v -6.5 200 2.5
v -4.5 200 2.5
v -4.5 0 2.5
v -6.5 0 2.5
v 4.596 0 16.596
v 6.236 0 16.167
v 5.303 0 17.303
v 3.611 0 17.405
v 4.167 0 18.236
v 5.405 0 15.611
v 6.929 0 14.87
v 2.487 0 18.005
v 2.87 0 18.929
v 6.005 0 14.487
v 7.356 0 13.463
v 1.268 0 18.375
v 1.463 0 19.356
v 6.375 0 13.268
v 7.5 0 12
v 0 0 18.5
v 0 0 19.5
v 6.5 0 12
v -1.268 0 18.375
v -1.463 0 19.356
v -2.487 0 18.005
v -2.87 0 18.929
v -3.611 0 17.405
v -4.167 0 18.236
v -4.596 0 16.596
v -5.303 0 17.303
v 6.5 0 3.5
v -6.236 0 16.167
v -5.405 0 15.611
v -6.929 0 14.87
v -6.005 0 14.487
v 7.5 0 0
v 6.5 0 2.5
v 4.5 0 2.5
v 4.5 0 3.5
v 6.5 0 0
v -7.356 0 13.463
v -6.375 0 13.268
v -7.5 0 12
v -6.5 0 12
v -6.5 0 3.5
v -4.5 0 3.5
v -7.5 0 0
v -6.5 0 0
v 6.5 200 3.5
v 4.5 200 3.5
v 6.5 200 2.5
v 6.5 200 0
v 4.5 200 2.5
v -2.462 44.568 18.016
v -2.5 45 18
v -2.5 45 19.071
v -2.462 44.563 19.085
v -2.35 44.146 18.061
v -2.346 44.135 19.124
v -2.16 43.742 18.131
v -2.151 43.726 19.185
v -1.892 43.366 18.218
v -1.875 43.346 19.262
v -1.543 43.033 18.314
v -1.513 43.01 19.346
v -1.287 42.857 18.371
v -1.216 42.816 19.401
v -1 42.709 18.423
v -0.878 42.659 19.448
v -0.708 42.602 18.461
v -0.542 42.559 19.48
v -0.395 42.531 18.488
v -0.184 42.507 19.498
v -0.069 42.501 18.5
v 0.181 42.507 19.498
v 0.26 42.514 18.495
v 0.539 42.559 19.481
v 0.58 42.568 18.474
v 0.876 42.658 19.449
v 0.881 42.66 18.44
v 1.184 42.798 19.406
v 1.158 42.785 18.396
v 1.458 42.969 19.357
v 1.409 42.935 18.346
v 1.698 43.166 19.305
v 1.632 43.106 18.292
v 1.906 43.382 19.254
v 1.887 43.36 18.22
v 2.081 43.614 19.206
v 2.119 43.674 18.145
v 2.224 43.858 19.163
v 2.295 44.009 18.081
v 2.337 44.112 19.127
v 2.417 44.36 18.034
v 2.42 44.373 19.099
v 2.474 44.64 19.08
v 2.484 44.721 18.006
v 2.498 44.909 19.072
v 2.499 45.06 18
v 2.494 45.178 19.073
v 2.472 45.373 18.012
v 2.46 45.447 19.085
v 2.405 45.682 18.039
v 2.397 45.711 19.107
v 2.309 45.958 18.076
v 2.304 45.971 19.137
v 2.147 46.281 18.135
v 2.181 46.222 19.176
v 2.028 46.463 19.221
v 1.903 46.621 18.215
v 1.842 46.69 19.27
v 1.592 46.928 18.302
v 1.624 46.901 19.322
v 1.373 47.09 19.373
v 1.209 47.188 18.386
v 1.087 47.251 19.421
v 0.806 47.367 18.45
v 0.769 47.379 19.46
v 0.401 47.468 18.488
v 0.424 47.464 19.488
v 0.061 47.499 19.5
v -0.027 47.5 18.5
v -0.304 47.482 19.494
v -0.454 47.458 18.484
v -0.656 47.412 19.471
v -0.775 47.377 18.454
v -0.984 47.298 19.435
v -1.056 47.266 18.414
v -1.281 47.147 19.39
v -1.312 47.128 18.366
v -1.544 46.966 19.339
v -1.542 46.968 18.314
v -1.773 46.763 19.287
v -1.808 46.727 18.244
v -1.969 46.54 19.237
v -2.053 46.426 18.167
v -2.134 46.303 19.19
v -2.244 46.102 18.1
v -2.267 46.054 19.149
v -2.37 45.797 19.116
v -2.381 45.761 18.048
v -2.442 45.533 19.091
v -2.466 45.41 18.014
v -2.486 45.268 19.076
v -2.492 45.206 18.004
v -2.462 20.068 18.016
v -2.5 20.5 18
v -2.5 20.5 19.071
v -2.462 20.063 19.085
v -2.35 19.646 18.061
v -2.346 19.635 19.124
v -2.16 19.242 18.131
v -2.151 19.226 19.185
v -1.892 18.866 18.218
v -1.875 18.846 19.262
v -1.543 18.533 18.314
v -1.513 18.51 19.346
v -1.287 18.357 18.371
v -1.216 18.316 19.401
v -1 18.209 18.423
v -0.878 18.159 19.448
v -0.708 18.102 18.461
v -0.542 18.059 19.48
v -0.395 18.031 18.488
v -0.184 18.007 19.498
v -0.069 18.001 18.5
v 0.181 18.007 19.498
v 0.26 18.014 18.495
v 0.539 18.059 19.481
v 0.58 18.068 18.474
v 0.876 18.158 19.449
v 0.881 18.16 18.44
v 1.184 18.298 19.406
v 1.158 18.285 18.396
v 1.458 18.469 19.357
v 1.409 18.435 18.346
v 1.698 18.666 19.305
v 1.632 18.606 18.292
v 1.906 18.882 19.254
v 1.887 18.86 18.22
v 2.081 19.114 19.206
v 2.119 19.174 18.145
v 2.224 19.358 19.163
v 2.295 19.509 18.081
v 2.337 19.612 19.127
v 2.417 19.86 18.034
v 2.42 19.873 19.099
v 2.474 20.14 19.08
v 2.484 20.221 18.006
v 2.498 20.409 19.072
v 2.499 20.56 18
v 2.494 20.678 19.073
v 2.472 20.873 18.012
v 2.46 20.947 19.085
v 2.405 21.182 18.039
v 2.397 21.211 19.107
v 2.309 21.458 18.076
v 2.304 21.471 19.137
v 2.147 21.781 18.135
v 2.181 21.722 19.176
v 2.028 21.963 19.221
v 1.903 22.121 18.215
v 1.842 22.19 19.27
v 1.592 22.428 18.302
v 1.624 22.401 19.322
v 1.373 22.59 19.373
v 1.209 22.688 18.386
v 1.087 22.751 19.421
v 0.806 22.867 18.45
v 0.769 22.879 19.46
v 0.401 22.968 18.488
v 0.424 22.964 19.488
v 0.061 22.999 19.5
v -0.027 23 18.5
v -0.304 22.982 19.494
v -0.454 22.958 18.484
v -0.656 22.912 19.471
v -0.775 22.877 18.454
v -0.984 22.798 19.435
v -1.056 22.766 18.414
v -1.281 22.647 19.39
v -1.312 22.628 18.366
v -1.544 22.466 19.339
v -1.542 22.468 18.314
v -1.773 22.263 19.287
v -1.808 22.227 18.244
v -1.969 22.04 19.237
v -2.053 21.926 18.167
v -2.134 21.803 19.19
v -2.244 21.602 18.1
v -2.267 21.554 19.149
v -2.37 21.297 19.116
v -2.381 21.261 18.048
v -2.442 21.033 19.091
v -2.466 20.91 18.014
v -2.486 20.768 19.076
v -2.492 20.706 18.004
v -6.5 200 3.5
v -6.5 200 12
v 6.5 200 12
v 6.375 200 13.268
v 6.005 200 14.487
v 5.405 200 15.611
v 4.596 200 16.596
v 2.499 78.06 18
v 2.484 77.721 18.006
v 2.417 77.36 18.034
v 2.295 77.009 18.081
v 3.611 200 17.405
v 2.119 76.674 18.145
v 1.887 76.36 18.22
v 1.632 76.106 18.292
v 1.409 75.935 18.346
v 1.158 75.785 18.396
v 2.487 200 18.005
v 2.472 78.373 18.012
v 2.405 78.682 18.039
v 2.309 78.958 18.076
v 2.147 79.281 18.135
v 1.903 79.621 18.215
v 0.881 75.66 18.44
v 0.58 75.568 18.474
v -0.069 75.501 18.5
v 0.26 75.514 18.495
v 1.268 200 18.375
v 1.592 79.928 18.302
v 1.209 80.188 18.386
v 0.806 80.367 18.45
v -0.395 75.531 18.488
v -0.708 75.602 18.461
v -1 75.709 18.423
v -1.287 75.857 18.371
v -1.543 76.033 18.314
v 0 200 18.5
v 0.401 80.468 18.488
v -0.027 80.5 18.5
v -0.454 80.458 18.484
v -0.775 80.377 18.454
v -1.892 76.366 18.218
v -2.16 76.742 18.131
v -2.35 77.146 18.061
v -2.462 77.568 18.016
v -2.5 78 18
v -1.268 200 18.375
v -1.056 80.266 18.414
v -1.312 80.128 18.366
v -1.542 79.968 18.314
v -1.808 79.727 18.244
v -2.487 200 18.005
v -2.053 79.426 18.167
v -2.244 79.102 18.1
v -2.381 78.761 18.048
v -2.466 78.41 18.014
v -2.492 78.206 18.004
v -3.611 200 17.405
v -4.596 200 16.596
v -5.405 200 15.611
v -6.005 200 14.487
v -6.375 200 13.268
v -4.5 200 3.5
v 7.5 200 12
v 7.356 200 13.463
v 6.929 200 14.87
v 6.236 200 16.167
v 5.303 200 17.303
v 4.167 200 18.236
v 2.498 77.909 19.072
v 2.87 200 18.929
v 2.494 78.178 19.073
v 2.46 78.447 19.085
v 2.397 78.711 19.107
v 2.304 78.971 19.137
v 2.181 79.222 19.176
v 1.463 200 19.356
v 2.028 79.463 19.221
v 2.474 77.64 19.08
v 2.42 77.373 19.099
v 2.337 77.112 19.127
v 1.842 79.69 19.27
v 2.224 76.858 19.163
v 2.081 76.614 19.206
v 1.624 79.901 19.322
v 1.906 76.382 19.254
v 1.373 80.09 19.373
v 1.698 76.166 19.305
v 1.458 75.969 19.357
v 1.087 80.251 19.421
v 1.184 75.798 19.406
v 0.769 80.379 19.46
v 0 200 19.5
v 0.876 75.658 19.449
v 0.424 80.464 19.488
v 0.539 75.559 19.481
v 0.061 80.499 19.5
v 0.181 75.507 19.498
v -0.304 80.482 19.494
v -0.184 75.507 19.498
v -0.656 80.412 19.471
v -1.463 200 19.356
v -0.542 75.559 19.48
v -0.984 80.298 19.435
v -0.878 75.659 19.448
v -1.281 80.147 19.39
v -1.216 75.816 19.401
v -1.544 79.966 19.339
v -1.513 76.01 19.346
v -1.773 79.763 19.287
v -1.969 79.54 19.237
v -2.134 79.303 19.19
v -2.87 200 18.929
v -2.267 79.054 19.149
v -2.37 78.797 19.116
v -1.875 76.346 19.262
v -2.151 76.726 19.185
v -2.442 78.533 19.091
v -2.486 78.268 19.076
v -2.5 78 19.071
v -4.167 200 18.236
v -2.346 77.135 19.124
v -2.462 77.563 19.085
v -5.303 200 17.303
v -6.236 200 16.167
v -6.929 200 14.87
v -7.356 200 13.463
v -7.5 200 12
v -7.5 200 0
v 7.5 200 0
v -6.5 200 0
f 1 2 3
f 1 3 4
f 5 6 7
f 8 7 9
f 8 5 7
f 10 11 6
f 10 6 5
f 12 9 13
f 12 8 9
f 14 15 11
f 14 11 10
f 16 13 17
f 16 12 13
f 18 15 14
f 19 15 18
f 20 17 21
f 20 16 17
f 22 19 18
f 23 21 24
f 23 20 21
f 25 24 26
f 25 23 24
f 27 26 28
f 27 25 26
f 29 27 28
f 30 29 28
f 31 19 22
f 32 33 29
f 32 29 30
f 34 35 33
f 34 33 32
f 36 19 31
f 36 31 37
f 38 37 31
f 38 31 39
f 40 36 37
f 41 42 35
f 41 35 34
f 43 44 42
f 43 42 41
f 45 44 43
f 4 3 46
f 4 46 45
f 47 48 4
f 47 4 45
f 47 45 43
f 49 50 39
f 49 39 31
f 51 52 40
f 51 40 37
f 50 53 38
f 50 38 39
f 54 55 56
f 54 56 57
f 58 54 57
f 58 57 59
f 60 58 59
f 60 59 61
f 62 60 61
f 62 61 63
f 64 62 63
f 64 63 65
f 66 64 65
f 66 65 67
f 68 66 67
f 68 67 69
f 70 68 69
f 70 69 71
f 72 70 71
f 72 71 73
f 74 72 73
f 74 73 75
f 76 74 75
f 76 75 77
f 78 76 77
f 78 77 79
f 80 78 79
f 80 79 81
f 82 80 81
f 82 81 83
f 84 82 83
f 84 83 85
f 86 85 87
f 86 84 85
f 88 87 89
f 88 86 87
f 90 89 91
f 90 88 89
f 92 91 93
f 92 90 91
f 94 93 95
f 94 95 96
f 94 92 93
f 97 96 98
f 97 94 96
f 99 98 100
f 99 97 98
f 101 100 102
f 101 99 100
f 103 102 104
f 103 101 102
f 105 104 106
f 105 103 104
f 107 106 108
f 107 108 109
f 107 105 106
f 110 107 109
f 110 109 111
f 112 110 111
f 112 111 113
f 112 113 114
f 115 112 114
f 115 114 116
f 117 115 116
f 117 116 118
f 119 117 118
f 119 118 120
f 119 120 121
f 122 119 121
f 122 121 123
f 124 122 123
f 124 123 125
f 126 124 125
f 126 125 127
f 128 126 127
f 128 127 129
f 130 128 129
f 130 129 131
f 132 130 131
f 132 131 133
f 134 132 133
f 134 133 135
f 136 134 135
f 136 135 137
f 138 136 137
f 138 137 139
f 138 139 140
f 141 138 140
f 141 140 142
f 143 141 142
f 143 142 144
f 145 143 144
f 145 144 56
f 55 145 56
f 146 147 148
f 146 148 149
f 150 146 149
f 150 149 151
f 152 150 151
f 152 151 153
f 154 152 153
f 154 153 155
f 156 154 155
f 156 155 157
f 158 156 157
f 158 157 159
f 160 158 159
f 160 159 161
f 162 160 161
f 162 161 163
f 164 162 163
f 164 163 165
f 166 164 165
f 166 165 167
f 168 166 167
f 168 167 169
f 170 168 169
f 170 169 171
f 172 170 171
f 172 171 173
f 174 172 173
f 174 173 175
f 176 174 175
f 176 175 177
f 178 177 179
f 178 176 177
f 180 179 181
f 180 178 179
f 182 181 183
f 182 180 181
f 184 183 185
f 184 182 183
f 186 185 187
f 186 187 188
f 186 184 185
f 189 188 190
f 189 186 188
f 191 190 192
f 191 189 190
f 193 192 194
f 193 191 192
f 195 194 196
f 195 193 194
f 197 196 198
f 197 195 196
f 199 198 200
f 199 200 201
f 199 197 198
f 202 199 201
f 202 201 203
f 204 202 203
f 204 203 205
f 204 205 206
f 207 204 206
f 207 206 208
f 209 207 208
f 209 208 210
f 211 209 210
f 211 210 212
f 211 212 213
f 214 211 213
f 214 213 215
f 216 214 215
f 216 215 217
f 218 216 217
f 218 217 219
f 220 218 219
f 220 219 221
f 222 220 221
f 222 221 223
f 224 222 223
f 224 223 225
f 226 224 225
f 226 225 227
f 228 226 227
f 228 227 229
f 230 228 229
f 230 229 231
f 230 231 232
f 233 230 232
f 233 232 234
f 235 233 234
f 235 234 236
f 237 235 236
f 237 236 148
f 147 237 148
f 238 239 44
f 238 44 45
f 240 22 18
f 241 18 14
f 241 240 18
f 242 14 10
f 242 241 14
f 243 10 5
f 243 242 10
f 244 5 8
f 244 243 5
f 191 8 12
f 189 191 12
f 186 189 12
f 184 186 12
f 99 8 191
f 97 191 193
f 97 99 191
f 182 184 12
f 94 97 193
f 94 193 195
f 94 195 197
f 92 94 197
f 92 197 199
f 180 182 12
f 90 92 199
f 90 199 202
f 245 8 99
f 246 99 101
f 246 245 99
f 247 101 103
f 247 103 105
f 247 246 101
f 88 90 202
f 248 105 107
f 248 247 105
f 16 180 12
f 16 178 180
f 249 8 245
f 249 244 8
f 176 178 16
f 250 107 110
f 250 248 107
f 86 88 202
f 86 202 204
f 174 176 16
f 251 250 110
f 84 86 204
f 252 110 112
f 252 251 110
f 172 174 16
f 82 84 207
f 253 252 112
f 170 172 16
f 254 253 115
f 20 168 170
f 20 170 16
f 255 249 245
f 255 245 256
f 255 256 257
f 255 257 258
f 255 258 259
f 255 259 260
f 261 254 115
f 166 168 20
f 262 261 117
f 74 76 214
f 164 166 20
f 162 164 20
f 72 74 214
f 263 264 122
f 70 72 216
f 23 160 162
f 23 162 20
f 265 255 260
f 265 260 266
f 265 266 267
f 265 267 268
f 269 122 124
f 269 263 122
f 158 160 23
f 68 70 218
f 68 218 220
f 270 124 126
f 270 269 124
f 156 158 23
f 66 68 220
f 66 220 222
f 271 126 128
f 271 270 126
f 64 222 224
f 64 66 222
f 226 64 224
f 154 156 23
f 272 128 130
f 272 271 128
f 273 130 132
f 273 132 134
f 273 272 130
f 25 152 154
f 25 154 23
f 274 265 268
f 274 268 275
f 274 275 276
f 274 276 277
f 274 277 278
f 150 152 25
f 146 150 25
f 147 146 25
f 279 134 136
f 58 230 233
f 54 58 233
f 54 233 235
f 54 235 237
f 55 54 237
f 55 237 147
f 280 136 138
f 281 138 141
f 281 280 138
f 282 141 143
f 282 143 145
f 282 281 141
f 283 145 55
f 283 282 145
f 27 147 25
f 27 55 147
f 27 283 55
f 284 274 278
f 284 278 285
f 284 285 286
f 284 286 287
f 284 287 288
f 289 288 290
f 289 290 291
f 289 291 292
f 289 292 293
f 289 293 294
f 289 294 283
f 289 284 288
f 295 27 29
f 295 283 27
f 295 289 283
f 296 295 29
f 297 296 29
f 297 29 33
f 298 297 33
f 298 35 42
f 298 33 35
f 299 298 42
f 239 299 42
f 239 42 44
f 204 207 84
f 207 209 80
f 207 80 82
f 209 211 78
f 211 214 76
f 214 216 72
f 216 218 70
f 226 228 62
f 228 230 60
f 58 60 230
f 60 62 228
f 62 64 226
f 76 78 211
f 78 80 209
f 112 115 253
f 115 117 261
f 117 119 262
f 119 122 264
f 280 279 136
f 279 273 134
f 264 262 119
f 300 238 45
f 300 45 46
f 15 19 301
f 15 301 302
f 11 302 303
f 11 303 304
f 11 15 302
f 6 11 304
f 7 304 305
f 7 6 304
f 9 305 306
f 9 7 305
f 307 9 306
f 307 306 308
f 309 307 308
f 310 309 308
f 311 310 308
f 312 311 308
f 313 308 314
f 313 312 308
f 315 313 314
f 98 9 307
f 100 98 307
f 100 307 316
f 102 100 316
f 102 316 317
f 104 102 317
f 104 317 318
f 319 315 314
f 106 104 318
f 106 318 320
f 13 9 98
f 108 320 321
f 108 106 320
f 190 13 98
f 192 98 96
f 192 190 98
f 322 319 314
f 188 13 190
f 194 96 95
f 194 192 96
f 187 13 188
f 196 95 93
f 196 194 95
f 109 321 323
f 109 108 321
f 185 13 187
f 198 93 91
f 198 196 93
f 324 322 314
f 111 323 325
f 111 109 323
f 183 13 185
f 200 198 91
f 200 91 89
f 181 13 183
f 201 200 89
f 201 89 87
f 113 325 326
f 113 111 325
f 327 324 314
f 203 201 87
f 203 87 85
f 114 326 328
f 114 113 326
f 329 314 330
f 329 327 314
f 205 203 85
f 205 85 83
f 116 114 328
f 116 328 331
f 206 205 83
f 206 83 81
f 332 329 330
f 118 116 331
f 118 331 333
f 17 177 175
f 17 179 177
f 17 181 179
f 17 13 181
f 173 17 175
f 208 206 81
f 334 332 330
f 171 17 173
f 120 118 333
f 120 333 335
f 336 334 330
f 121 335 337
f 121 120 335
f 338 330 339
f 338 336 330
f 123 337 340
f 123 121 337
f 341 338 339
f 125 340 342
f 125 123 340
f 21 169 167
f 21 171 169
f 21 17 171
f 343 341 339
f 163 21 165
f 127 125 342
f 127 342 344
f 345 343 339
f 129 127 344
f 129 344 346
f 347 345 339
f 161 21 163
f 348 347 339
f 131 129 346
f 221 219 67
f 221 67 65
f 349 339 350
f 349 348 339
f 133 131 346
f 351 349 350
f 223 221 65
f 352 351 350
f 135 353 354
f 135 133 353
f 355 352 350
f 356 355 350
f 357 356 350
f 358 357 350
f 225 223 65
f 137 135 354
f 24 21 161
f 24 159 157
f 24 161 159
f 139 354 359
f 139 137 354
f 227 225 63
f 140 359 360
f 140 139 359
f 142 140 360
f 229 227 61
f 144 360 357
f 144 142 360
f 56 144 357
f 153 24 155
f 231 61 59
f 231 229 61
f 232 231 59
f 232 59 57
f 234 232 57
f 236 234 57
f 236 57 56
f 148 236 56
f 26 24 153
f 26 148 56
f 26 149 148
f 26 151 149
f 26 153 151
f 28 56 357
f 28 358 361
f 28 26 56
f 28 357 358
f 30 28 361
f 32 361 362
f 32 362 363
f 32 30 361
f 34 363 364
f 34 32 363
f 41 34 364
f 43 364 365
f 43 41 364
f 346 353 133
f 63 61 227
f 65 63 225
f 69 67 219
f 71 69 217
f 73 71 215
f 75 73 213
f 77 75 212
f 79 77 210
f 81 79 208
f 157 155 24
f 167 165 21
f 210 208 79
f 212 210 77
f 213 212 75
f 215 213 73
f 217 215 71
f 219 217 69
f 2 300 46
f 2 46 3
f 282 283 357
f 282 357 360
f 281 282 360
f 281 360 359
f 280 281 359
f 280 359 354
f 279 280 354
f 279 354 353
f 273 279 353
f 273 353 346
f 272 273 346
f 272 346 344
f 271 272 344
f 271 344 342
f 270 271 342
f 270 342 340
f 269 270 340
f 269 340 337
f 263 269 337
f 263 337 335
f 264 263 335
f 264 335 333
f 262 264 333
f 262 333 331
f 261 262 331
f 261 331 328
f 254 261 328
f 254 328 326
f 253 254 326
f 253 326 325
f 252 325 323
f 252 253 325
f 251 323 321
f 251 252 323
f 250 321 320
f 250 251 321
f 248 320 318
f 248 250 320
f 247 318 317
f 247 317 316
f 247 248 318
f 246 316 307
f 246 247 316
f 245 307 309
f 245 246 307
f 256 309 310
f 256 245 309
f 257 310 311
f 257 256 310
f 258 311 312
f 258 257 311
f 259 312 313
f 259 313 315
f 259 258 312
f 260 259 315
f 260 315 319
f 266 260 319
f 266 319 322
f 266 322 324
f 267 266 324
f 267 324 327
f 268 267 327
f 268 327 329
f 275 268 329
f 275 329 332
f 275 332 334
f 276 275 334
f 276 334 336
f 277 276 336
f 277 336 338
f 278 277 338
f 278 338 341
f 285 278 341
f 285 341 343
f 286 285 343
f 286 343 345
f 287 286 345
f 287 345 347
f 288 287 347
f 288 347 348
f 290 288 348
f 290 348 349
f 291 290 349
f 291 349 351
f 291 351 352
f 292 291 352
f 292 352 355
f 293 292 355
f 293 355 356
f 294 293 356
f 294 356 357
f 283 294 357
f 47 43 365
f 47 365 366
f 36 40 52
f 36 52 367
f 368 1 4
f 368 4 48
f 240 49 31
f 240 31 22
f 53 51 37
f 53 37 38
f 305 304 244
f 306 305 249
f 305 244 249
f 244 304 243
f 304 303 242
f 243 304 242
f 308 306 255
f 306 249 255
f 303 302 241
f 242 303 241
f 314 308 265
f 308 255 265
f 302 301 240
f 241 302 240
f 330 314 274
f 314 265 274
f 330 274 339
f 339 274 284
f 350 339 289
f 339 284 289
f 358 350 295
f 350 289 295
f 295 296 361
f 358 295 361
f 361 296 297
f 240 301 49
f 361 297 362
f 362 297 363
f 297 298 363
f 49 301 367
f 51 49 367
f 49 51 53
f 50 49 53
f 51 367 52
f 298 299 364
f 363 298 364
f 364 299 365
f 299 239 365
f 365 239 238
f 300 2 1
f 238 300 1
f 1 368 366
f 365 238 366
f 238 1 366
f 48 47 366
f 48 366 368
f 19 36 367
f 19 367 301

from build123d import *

# Parameters (mm, degrees)
BOSS_EXTRU_1_DEPTH      = 200
ENL_V_MAT_EXTRU_1_DEPTH = 202.088289067
ESQUISSE6_R             = 2.5
ENL_V_MAT_EXTRU_3_DEPTH = 202.088289067


with BuildPart() as part:
    # Esquisse1 → Boss.-Extru.1 (new body)
    with BuildSketch(Plane(origin=(0, 0, 0), x_dir=(1, 0, 0), z_dir=(0, 1, 0))):
        with BuildLine():
            Line((-7.5, 0), (7.5, 0))
            Line((7.5, 0), (7.5, -12))
            ThreePointArc((7.5, -12), (0, -19.5), (-7.5, -12))
            Line((-7.5, -12), (-7.5, 0))
        make_face()
    extrude(amount=BOSS_EXTRU_1_DEPTH)

    # Esquisse2 → Enlèv. mat.-Extru.1 (cut, through all)
    with BuildSketch(Plane(origin=(0, 200, 0), x_dir=(1, 0, 0), z_dir=(0, 1, 0))):
        with BuildLine():
            Line((-6.5, 2.5), (6.5, 2.5))
            Line((6.5, 2.5), (6.5, -2.5))
            Line((6.5, -2.5), (4.5, -2.5))
            Line((4.5, -2.5), (4.5, -3.5))
            Line((4.5, -3.5), (6.5, -3.5))
            Line((6.5, -3.5), (6.5, -12))
            ThreePointArc((6.5, -12), (0, -18.5), (-6.5, -12))
            Line((-6.5, -12), (-6.5, -3.5))
            Line((-6.5, -3.5), (-4.5, -3.5))
            Line((-4.5, -3.5), (-4.5, -2.5))
            Line((-4.5, -2.5), (-6.5, -2.5))
            Line((-6.5, -2.5), (-6.5, 2.5))
        make_face()
    extrude(amount=-ENL_V_MAT_EXTRU_1_DEPTH, mode=Mode.SUBTRACT)

    # Esquisse6 → Enlèv. mat.-Extru.3 (cut, through all)
    with BuildSketch(Plane.XY):
        with Locations(Location((0, 20.5, 0), (0, 0, 180))):
            Circle(ESQUISSE6_R)
        with Locations(Location((0, 45, 0), (0, 0, 180))):
            Circle(ESQUISSE6_R)
        with Locations(Location((0, 78, 0), (0, 0, 180))):
            Circle(ESQUISSE6_R)
    extrude(amount=ENL_V_MAT_EXTRU_3_DEPTH, mode=Mode.SUBTRACT)


solid = part.part
